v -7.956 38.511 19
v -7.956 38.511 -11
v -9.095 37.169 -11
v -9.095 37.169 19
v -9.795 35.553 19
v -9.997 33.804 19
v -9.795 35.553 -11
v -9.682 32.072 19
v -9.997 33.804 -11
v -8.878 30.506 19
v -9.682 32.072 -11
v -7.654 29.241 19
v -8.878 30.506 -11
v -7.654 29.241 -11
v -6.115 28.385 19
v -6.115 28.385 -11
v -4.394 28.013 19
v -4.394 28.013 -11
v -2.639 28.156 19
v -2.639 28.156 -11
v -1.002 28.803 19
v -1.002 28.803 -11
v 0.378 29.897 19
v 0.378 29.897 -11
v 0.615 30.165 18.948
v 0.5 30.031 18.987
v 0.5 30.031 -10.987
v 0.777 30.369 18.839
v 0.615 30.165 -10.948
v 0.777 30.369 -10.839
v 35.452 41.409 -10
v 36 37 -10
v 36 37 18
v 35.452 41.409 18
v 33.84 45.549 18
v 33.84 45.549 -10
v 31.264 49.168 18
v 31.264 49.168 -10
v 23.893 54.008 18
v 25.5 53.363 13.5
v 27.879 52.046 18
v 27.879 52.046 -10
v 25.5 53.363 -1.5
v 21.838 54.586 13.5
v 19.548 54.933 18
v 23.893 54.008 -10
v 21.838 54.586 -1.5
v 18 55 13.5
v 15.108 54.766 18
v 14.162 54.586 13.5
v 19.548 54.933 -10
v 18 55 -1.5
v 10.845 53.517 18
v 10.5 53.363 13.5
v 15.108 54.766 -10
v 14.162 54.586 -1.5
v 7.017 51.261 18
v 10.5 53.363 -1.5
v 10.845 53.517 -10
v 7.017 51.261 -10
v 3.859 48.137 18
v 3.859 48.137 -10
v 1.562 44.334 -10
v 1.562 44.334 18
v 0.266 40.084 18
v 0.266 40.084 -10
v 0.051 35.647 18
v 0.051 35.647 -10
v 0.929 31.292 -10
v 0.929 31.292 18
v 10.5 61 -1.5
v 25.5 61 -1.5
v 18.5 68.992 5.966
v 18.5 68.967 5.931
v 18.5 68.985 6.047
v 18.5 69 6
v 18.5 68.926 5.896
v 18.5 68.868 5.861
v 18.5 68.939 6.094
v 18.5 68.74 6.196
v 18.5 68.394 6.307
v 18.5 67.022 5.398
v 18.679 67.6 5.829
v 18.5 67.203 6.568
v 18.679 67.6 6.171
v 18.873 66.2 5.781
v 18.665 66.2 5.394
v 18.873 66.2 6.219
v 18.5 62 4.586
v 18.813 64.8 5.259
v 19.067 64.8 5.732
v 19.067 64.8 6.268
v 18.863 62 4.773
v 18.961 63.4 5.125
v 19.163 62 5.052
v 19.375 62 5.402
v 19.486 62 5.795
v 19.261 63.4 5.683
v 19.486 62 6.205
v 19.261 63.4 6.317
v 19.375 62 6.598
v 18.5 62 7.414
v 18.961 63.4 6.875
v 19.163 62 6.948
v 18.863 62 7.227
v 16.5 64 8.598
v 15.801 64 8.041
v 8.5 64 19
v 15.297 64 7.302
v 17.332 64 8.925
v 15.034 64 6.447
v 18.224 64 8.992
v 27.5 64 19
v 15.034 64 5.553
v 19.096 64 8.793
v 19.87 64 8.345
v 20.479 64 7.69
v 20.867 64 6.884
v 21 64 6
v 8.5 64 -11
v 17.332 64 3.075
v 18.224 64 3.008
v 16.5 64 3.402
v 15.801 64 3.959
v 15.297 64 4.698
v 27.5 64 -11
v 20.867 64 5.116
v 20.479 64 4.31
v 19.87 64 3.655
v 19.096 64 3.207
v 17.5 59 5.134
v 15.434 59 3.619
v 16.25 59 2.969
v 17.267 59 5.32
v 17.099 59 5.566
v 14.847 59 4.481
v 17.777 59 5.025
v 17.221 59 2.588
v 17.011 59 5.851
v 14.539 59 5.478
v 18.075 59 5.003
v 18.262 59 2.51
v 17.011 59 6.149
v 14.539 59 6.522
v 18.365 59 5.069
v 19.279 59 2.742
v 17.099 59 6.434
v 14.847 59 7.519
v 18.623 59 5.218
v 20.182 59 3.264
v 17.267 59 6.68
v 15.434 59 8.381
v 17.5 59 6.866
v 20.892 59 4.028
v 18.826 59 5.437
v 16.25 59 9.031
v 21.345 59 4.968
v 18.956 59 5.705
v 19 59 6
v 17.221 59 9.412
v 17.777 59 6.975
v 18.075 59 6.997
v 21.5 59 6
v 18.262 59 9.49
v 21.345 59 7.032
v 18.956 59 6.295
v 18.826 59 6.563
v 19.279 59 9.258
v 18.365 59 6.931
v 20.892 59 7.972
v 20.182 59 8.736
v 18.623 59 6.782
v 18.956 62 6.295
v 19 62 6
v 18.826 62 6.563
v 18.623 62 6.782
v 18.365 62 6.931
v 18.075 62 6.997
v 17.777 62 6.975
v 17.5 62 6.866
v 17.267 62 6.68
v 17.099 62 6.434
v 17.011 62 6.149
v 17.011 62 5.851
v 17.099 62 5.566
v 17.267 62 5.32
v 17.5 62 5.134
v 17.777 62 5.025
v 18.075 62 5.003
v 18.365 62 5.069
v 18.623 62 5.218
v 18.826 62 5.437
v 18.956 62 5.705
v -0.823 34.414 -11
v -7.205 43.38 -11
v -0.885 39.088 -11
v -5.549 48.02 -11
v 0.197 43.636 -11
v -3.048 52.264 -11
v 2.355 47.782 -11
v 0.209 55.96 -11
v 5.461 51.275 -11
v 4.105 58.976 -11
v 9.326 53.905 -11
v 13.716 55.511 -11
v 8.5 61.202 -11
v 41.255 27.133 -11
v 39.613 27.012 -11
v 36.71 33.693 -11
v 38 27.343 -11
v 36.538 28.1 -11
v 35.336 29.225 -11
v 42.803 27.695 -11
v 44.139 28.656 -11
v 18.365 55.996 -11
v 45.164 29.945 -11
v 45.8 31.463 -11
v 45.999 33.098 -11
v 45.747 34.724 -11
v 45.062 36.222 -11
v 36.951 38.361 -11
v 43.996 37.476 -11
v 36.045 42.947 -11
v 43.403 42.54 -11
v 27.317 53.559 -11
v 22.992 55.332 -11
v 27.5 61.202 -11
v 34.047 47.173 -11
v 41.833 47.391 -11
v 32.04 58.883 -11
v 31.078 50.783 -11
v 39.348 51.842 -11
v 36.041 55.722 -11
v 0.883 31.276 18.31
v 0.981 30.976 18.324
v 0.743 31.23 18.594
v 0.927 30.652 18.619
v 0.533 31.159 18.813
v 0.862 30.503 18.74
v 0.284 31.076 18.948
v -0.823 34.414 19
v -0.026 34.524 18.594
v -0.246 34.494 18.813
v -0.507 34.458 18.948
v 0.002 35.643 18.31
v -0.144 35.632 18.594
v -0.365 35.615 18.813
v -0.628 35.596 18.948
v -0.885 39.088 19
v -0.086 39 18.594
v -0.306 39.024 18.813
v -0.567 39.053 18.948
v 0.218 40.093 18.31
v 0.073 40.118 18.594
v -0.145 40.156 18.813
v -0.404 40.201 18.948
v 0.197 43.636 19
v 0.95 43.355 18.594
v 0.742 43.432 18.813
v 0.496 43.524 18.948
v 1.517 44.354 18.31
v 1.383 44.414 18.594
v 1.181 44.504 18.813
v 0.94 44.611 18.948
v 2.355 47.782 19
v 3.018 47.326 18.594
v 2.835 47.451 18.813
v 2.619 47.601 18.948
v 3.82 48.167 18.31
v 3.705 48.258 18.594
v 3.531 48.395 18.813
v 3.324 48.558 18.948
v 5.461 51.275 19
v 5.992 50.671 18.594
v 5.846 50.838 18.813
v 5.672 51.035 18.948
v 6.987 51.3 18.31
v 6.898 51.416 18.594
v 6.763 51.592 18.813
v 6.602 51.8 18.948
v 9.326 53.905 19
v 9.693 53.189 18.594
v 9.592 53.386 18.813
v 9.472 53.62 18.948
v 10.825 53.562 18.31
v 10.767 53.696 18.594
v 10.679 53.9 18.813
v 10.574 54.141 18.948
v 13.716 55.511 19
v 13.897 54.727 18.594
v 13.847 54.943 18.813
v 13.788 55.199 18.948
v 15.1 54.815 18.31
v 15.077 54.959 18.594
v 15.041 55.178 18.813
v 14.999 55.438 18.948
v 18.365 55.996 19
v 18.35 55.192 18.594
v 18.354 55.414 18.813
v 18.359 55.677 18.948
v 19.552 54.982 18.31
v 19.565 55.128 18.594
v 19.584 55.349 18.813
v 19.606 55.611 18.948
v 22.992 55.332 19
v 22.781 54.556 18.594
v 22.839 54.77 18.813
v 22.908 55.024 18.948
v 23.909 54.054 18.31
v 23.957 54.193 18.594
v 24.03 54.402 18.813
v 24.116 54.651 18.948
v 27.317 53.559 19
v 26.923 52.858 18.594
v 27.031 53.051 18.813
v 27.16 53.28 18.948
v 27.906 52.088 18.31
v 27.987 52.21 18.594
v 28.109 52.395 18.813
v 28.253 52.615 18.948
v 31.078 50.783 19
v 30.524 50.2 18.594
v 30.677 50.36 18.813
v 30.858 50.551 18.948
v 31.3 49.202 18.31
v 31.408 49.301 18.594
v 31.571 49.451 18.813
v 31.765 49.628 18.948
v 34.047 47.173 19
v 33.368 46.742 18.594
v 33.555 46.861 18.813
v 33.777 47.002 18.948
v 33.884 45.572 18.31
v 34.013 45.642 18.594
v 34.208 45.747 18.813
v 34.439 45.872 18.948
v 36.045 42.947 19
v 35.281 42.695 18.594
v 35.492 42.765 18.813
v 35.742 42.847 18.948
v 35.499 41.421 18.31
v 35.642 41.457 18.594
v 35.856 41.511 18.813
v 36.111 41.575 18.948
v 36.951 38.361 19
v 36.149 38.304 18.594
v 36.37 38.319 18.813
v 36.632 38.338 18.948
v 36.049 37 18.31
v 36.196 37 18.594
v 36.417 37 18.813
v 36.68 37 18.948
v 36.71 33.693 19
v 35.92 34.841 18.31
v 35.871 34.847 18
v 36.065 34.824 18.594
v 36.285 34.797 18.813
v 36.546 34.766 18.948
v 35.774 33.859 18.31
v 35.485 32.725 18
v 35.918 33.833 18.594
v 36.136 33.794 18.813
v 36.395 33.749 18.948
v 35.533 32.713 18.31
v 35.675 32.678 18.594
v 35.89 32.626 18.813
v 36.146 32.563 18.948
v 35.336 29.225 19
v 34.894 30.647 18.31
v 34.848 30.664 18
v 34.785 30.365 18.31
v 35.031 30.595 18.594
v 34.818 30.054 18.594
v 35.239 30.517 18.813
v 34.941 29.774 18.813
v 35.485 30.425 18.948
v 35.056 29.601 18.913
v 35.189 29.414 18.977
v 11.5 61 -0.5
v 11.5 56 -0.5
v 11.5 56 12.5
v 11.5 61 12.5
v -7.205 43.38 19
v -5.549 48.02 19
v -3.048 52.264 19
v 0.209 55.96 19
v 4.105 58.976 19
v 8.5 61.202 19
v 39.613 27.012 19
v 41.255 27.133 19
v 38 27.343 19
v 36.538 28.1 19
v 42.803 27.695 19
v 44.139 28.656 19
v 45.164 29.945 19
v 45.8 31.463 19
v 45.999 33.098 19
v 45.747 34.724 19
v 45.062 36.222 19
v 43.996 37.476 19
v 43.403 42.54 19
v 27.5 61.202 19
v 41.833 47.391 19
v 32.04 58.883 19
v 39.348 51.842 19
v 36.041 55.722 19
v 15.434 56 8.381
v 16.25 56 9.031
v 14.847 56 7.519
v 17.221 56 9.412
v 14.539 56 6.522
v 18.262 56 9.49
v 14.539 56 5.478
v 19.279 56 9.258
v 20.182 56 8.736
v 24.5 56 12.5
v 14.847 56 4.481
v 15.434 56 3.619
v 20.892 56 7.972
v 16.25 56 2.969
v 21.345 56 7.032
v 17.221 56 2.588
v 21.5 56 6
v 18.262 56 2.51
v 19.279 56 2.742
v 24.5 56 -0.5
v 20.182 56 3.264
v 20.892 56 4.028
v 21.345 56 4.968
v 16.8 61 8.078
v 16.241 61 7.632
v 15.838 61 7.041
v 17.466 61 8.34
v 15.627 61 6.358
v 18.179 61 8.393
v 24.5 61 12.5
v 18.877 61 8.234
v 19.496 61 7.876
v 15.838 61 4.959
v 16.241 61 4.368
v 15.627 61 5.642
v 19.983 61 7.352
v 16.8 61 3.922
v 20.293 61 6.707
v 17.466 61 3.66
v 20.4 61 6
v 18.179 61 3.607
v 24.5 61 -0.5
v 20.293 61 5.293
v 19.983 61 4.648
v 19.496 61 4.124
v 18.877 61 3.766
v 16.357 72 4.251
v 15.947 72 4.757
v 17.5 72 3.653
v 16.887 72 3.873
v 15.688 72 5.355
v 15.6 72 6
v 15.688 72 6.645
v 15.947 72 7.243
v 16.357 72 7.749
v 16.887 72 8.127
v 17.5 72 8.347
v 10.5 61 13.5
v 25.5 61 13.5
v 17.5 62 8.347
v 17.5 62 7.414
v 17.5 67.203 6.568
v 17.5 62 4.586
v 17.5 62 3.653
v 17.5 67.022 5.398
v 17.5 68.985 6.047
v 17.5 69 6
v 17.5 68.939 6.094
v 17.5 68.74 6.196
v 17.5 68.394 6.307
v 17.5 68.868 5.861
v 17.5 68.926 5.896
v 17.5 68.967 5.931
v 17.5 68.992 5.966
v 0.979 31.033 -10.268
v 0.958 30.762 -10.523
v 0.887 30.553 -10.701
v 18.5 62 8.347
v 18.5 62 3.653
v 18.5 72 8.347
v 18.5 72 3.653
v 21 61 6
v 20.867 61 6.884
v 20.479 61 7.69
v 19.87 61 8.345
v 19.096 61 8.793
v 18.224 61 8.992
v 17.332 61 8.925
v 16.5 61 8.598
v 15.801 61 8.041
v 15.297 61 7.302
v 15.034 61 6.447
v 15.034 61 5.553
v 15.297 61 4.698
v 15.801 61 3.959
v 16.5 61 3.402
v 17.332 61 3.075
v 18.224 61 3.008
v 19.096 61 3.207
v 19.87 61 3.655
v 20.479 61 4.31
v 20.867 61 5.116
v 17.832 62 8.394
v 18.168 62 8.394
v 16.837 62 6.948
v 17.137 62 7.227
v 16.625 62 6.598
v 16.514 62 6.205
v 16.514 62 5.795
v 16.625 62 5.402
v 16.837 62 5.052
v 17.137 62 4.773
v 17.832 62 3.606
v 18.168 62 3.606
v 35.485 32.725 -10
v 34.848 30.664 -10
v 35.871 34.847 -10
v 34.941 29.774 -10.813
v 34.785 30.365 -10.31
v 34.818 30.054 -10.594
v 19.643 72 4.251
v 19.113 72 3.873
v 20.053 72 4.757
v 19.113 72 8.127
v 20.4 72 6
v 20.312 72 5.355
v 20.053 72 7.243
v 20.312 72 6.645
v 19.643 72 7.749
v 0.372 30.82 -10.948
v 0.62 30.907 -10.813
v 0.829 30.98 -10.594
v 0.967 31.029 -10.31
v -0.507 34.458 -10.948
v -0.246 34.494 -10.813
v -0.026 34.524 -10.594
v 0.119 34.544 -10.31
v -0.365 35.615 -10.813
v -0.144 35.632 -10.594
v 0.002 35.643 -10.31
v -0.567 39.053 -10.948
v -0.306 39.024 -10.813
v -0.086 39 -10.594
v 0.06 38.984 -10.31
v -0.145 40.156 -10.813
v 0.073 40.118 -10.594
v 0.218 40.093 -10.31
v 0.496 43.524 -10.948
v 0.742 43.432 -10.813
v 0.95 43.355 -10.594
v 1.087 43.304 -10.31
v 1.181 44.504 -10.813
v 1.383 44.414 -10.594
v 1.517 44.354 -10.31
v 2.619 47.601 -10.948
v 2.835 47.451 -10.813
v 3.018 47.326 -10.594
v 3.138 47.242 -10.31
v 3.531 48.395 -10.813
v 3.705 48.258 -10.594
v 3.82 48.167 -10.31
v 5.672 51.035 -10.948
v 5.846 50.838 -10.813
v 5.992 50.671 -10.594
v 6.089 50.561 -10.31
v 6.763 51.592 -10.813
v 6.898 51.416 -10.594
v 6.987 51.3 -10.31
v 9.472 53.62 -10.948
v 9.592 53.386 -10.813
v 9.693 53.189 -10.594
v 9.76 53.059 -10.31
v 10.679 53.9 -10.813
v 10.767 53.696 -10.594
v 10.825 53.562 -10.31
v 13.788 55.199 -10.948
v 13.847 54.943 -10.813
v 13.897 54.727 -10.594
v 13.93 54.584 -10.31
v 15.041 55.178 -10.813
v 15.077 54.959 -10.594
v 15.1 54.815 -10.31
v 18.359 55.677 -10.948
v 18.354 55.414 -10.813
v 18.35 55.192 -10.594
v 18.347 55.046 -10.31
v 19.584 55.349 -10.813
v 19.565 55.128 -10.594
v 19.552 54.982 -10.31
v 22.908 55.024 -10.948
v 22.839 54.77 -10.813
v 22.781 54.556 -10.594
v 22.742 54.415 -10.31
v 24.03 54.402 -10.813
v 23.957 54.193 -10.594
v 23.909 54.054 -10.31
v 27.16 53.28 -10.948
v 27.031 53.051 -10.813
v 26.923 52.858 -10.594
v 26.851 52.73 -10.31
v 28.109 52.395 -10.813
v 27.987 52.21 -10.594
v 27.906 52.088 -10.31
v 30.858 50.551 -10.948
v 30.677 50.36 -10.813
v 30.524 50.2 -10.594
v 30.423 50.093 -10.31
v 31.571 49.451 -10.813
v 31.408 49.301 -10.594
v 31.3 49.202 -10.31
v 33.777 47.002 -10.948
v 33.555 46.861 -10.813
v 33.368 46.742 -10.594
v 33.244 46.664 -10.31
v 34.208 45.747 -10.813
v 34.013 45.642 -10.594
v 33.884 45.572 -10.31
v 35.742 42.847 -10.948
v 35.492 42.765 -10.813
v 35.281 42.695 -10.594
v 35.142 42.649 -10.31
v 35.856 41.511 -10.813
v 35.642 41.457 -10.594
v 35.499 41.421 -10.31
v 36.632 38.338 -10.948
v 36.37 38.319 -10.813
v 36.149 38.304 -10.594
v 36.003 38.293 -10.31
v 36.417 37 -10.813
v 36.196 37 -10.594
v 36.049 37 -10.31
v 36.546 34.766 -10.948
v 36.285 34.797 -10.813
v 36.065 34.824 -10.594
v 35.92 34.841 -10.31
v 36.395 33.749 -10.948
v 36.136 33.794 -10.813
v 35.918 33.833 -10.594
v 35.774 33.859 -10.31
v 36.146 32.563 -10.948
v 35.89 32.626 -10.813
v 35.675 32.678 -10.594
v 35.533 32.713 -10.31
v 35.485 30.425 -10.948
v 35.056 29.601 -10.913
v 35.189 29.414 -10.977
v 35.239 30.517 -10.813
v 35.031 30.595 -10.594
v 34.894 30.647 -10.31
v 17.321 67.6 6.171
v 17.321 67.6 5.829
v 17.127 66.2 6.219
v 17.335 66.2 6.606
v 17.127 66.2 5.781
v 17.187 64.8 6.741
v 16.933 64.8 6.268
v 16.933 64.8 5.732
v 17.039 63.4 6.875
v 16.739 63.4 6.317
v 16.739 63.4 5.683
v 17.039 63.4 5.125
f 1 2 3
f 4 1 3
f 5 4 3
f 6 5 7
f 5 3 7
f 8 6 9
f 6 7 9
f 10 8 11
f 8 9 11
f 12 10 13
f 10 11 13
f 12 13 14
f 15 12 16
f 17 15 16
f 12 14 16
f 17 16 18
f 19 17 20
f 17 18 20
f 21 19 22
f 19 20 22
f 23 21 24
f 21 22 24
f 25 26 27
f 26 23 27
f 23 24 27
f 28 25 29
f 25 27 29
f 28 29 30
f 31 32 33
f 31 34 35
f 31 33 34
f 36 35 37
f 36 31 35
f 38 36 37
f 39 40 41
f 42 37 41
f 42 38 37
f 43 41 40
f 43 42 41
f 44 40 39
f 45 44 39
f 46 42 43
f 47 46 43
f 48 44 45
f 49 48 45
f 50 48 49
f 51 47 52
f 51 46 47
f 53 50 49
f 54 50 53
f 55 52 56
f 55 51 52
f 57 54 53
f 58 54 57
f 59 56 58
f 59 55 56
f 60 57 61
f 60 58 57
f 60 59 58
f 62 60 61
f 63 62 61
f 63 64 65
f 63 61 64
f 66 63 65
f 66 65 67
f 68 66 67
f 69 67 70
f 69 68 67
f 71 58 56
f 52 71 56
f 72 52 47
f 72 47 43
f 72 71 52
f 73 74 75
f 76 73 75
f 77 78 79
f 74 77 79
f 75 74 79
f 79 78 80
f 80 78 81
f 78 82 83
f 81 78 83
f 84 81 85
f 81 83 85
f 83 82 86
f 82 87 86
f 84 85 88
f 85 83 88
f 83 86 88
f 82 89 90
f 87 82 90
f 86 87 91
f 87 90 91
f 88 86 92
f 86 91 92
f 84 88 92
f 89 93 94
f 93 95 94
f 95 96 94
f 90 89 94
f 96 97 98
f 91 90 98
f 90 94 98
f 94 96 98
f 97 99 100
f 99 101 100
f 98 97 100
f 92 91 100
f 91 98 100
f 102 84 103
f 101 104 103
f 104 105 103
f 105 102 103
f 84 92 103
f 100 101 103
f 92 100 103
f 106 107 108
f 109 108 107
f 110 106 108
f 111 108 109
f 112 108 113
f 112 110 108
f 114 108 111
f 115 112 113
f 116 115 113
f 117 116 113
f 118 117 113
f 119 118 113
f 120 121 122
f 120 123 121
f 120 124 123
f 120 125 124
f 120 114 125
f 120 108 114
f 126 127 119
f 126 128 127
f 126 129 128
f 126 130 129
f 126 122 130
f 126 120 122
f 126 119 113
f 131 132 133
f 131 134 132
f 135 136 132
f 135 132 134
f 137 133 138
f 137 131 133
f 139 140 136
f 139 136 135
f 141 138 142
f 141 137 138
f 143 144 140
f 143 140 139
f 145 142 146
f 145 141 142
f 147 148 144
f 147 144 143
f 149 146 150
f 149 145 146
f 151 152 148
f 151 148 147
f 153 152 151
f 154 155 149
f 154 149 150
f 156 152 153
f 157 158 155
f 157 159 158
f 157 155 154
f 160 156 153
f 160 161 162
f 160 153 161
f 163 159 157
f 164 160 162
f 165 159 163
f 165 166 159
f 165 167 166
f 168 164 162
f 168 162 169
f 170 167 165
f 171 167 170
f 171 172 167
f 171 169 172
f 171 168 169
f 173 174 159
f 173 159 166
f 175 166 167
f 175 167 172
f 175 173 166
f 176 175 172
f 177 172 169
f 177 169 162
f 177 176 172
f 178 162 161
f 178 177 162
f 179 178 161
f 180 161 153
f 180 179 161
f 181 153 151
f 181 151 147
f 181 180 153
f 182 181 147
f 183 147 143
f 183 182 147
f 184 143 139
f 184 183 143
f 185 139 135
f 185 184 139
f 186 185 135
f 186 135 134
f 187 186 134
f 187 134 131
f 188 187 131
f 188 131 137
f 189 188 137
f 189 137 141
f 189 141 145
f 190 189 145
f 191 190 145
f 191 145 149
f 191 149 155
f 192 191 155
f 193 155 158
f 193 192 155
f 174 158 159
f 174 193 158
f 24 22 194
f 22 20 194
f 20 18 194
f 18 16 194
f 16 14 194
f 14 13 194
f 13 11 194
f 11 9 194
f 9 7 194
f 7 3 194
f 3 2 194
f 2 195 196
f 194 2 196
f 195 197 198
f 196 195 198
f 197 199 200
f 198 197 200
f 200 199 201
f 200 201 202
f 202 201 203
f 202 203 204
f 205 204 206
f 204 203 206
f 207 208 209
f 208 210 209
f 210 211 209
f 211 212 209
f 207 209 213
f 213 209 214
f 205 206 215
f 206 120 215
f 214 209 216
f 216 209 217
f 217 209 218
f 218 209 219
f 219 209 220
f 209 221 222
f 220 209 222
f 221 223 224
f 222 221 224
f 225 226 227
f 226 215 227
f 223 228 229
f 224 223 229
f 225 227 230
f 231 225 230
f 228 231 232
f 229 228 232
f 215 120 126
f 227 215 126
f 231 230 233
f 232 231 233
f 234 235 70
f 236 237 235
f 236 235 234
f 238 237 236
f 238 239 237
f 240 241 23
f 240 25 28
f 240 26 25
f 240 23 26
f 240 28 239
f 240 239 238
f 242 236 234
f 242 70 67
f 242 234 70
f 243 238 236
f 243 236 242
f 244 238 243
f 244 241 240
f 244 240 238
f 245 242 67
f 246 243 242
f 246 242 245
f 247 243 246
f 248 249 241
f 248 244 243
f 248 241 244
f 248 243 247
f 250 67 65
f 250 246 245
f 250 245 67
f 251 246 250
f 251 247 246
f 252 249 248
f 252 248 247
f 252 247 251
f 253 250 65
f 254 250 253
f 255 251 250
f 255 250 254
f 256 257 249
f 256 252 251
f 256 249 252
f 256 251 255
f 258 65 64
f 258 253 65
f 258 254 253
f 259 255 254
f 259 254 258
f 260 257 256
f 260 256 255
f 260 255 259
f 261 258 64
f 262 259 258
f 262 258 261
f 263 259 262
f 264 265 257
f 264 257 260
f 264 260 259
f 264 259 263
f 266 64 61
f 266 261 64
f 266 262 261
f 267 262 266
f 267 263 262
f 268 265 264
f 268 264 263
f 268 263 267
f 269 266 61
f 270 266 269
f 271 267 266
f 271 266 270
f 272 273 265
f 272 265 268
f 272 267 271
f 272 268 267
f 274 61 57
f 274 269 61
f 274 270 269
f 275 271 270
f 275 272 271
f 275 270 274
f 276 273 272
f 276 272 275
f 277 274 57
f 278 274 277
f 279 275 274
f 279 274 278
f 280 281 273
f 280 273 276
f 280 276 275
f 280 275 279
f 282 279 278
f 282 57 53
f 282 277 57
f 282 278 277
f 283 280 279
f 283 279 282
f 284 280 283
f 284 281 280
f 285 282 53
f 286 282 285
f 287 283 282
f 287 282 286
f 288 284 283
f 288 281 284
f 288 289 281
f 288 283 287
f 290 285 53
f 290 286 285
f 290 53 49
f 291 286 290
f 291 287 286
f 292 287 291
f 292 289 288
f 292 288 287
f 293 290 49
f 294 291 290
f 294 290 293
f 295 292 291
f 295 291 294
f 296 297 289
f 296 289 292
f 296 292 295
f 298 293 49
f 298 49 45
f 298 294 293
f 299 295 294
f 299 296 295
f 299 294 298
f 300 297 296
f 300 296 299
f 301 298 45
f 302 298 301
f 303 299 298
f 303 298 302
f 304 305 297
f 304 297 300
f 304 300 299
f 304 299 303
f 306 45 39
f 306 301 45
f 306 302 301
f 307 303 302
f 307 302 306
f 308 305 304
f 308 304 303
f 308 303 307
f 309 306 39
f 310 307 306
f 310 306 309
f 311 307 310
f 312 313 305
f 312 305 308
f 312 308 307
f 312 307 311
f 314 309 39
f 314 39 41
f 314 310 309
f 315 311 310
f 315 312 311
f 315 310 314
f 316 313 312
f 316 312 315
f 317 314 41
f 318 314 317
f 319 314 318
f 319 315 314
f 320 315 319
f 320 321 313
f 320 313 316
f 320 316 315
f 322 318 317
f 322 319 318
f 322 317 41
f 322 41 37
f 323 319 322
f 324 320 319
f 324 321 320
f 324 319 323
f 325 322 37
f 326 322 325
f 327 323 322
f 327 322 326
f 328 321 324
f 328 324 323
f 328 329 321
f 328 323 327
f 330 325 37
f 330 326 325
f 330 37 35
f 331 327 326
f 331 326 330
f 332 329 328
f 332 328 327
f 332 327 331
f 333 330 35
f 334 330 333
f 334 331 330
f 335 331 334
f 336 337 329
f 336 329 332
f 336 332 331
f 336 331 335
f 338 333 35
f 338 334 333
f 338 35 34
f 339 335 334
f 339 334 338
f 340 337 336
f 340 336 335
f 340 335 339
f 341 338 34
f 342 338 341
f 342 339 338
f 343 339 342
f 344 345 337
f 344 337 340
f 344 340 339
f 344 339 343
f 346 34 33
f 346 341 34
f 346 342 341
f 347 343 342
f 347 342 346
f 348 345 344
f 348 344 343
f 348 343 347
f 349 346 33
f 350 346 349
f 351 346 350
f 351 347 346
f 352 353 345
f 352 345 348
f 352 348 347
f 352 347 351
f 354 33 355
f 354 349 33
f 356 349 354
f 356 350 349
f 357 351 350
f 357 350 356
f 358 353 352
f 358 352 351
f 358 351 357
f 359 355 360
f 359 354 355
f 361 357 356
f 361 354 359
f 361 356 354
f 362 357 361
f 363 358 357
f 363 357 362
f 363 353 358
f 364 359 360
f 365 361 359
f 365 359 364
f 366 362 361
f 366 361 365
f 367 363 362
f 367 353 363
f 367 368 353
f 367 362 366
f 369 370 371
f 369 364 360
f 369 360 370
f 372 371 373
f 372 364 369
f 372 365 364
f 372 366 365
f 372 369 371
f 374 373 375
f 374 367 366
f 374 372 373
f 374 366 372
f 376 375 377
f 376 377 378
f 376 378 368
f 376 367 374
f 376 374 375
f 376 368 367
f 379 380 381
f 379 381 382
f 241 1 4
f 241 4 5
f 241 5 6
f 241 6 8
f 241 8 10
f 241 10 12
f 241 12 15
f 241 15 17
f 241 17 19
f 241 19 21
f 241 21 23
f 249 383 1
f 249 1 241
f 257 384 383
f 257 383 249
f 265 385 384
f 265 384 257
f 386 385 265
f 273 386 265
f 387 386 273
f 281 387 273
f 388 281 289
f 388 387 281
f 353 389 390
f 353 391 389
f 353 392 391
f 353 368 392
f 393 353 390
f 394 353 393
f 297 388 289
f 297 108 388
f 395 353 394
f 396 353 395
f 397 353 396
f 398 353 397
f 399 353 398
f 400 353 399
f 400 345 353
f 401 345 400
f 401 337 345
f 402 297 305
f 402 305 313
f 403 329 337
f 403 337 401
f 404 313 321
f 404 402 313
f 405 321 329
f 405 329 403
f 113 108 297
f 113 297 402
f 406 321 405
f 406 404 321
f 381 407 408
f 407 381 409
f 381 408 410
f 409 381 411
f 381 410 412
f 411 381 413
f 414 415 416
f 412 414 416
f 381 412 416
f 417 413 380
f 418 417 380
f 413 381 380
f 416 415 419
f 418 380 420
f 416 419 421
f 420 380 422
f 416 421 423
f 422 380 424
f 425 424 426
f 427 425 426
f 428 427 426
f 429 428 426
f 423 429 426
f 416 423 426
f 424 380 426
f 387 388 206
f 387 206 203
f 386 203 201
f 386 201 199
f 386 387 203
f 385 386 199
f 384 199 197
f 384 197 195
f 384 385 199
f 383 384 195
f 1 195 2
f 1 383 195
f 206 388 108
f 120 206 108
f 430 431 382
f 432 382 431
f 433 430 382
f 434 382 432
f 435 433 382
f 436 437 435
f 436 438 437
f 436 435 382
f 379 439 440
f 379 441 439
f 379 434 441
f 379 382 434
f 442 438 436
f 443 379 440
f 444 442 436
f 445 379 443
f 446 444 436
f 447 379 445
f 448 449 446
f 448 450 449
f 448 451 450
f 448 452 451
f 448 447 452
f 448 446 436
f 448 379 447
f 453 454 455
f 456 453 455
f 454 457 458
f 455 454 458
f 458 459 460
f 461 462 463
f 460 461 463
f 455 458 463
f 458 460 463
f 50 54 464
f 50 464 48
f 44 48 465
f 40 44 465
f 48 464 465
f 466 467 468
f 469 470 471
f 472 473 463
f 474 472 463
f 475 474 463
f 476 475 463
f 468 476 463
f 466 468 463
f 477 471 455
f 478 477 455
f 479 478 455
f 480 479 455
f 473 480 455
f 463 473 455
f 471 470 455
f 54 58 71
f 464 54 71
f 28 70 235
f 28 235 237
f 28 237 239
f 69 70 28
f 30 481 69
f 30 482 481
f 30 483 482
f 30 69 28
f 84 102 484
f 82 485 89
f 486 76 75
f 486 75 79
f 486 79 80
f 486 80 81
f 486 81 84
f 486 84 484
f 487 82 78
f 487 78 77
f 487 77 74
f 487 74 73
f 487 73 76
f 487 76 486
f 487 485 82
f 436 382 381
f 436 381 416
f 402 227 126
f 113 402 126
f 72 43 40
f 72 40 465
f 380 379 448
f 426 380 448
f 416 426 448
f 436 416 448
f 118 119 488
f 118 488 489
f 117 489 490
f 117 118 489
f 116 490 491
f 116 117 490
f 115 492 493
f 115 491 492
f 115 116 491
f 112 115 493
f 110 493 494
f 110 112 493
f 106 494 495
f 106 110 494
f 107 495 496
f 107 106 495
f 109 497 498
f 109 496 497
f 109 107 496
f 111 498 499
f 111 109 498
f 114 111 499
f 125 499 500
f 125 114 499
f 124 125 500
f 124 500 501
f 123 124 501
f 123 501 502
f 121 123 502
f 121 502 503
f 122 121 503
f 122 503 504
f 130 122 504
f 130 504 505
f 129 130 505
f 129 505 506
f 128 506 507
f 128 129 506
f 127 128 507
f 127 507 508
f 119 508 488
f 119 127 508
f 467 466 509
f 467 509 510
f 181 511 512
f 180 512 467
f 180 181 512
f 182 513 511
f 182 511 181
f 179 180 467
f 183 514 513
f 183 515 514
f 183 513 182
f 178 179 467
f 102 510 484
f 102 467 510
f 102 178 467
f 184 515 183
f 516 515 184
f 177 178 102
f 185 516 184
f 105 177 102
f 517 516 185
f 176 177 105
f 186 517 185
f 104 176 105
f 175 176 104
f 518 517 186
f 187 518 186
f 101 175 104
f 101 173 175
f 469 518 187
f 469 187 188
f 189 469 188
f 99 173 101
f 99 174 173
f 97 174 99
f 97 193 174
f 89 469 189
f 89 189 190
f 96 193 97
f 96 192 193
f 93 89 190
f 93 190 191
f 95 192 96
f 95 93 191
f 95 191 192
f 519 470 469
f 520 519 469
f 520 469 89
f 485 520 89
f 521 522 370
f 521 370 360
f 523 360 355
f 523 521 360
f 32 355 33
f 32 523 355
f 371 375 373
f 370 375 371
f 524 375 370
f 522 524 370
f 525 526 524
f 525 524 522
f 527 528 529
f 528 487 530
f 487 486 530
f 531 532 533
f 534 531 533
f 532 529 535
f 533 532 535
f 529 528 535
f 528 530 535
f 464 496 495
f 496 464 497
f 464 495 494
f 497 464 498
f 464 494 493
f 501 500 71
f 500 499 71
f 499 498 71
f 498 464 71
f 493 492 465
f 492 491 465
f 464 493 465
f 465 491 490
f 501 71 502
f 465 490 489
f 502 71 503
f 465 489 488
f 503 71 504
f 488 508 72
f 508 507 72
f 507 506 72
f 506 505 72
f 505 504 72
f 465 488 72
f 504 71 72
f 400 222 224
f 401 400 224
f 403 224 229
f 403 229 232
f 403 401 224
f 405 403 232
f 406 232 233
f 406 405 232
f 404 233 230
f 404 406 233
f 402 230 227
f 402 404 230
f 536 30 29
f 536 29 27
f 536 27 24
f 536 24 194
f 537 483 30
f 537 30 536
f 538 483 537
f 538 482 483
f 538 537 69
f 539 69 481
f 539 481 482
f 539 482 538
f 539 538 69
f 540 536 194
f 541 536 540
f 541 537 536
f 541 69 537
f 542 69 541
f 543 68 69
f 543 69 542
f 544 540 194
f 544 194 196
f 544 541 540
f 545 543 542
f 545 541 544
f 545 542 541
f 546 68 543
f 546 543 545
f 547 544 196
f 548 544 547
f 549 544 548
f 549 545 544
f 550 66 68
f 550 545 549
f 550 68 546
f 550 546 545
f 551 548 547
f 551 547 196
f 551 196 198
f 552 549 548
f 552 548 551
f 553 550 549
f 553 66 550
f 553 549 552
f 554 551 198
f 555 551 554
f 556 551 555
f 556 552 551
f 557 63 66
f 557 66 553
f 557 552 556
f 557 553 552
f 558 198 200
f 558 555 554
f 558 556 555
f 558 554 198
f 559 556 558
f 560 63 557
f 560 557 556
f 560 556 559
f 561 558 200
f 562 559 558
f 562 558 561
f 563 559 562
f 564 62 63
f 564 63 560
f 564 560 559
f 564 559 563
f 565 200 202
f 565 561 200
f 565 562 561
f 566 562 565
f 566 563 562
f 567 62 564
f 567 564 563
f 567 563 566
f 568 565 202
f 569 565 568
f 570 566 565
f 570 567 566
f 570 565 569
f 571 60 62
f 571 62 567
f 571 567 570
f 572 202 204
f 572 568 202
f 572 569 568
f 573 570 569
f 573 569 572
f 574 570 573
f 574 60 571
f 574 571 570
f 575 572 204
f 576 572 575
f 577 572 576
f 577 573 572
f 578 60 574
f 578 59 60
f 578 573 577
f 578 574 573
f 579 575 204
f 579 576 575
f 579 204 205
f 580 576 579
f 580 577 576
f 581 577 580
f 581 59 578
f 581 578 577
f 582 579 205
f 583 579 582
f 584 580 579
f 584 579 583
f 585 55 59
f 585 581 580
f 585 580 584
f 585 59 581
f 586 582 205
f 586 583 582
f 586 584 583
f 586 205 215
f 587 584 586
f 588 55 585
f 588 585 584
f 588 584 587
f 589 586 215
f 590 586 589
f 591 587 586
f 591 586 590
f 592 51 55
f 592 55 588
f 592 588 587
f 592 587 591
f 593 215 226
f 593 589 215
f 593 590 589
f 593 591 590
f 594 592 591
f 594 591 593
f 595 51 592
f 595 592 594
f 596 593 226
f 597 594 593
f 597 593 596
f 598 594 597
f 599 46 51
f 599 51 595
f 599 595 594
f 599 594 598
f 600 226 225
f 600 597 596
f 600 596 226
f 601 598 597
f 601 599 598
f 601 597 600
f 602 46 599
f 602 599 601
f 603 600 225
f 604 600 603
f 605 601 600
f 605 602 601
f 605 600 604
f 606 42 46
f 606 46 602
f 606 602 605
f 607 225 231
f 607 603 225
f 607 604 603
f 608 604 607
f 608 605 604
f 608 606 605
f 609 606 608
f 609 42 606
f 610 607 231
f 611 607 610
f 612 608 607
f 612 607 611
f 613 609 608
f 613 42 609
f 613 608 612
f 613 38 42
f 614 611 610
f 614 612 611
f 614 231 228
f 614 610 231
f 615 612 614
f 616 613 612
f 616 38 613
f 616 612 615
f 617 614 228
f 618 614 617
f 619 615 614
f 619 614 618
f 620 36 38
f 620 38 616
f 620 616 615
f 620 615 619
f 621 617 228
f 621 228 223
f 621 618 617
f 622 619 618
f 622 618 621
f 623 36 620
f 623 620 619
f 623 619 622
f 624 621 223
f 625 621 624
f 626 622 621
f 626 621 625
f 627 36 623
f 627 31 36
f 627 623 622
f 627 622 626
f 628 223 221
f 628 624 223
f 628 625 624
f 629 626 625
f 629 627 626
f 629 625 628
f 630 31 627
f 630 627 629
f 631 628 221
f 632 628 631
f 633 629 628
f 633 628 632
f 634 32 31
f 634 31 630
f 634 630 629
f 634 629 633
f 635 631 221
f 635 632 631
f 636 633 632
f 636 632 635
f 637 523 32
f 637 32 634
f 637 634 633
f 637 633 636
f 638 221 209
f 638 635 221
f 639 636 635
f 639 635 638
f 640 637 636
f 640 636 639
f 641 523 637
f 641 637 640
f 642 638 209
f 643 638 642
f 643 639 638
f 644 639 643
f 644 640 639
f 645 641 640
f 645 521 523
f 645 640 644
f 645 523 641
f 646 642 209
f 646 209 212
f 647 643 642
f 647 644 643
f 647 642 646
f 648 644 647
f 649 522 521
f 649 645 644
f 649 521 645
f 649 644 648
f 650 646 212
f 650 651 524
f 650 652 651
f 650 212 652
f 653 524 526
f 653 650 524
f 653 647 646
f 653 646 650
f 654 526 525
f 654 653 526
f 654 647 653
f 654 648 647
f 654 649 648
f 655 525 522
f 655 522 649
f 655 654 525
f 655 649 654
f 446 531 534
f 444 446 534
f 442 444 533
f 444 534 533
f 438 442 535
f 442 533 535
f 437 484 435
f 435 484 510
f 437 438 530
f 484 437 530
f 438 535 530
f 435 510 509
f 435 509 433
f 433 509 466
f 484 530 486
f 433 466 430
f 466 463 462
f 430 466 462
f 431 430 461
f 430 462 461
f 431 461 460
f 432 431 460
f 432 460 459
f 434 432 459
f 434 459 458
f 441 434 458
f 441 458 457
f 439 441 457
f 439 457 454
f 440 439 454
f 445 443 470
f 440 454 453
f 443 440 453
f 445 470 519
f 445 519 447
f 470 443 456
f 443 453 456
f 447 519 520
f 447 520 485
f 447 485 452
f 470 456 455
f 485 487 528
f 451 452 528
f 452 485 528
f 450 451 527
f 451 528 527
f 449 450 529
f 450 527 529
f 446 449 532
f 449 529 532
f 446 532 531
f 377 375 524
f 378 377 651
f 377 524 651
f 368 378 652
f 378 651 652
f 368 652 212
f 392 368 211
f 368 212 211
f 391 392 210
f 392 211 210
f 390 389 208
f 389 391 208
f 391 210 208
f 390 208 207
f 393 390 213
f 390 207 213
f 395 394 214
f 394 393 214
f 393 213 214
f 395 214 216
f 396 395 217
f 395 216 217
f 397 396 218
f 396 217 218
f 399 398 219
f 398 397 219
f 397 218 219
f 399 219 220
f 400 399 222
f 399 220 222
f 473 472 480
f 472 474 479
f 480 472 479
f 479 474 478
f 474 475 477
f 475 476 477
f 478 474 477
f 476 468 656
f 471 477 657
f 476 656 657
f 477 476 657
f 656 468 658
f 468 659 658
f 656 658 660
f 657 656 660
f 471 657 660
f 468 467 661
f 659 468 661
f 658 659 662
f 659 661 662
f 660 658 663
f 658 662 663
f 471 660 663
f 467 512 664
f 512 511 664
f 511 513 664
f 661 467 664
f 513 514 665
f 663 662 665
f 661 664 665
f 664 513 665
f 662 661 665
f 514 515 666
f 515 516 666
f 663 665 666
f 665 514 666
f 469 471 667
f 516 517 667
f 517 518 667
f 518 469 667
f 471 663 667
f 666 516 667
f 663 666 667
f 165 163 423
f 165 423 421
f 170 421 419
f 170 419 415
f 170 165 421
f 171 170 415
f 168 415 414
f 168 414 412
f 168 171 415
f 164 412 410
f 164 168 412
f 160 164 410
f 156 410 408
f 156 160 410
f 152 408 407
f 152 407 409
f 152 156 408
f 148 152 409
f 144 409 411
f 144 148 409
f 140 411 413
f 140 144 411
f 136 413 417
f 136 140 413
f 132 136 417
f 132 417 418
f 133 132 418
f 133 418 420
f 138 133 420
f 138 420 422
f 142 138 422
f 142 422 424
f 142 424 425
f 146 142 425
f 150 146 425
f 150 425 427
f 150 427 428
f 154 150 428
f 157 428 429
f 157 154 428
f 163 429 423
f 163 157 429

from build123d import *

# Parameters (mm, degrees)
CONE_ROLL_ANGLE             = 90
CYLINDER_R                  = 1
CYLINDER_DEPTH              = 3
CYLINDER_ROLL_ANGLE         = 90
CYLINDER005_R               = 3.5
CYLINDER005_DEPTH           = 3
CYLINDER005_ROLL_ANGLE      = 90
BOX_W                       = 1
BOX_H                       = 10
BOX_DEPTH                   = 10
BOX002_W                    = 13
BOX002_H                    = 5
BOX002_DEPTH                = 13
CYLINDER002_R               = 2.4
CYLINDER002_DEPTH           = 13
CYLINDER002_ROLL_ANGLE      = 90
CYLINDER006_R               = 18
CYLINDER006_DEPTH           = 32
CYLINDER010_R               = 3
CYLINDER010_DEPTH           = 13
CYLINDER010_ROLL_ANGLE      = 90
BOX003_W                    = 15
BOX003_H                    = 8
BOX003_DEPTH                = 15
CYLINDER009_R               = 6
CYLINDER009_DEPTH           = 30
CYLINDER007_W               = 26
CYLINDER007_H               = 30
CYLINDER007_ANGLE           = 201
CYLINDER007_PLACEMENT_ANGLE = -11
BOX004_W                    = 19
BOX004_H                    = 3
BOX004_DEPTH                = 30
CYLINDER008_R               = 6
CYLINDER008_DEPTH           = 30
FILLET_R                    = 1


with BuildPart() as screw_guide:
    # Cone → Cone (revolve)
    with BuildSketch(Plane.XZ):
        Polygon((0, 0), (0.5, 0), (1.5, 7), (0, 7), align=None)
    revolve(axis=Axis((0, 0, 0), (0, 0, 1)))


with BuildPart() as screw_guide_1:
    # Cone roll: moved
    add(screw_guide.part.rotate(Axis((0, 0, 0), (1, 0, 0)), CONE_ROLL_ANGLE))


with BuildPart() as screw_guide_2:
    # Cone placement: moved
    add(screw_guide_1.part.moved(Location((18, 69, 6))))


with BuildPart() as hole:
    # Cylinder → Cylinder (new body)
    with BuildSketch(Plane.XY):
        Circle(CYLINDER_R)
    extrude(amount=CYLINDER_DEPTH)


with BuildPart() as hole_1:
    # Cylinder roll: moved
    add(hole.part.rotate(Axis((0, 0, 0), (1, 0, 0)), CYLINDER_ROLL_ANGLE))


with BuildPart() as hole_2:
    # Cylinder placement: moved
    add(hole_1.part.moved(Location((18, 62, 6))))


with BuildPart() as screw_head_seat:
    # Cylinder005 → Cylinder005 (new body)
    with BuildSketch(Plane.XY):
        Circle(CYLINDER005_R)
    extrude(amount=CYLINDER005_DEPTH)


with BuildPart() as screw_head_seat_1:
    # Cylinder005 roll: moved
    add(screw_head_seat.part.rotate(Axis((0, 0, 0), (1, 0, 0)), CYLINDER005_ROLL_ANGLE))


with BuildPart() as screw_head_seat_2:
    # Cylinder005 placement: moved
    add(screw_head_seat_1.part.moved(Location((18, 59, 6))))


with BuildPart() as hole_and_cut:
    # Box → Box (new body)
    with BuildSketch(Plane(origin=(17.5, 62, 1), x_dir=(1, 0, 0), z_dir=(0, 0, 1))):
        with Locations((0.5, 5)):
            Rectangle(BOX_W, BOX_H)
    extrude(amount=BOX_DEPTH)

    # Fusion: union screw guide, hole, screw head seat
    add(screw_guide_2.part)
    add(hole_2.part)
    add(screw_head_seat_2.part)


with BuildPart() as squared_washer:
    # Box002 → Box002 (new body)
    with BuildSketch(Plane(origin=(11.5, 56, -0.5), x_dir=(1, 0, 0), z_dir=(0, 0, 1))):
        with Locations((6.5, 2.5)):
            Rectangle(BOX002_W, BOX002_H)
    extrude(amount=BOX002_DEPTH)


with BuildPart() as anchor_with_hole_and_cut:
    # Cylinder002 → Cylinder002 (new body)
    with BuildSketch(Plane.XY):
        Circle(CYLINDER002_R)
    extrude(amount=CYLINDER002_DEPTH)


with BuildPart() as anchor_with_hole_and_cut_1:
    # Cylinder002 roll: moved
    add(anchor_with_hole_and_cut.part.rotate(Axis((0, 0, 0), (1, 0, 0)), CYLINDER002_ROLL_ANGLE))


with BuildPart() as anchor_with_hole_and_cut_2:
    # Cylinder002 placement: moved
    add(anchor_with_hole_and_cut_1.part.moved(Location((18, 72, 6))))

    # Fusion001: union squared washer
    add(squared_washer.part)

    # Cut: cut hole and cut
    add(hole_and_cut.part, mode=Mode.SUBTRACT)


with BuildPart() as vacuum_cleaner_tube_template:
    # Cylinder006 → Cylinder006 (new body)
    with BuildSketch(Plane(origin=(18, 37, -12), x_dir=(1, 0, 0), z_dir=(0, 0, 1))):
        Circle(CYLINDER006_R)
    extrude(amount=CYLINDER006_DEPTH)


with BuildPart() as anchor_pin_seat:
    # Cylinder010 → Cylinder010 (new body)
    with BuildSketch(Plane.XY):
        Circle(CYLINDER010_R)
    extrude(amount=CYLINDER010_DEPTH)


with BuildPart() as anchor_pin_seat_1:
    # Cylinder010 roll: moved
    add(anchor_pin_seat.part.rotate(Axis((0, 0, 0), (1, 0, 0)), CYLINDER010_ROLL_ANGLE))


with BuildPart() as anchor_pin_seat_2:
    # Cylinder010 placement: moved
    add(anchor_pin_seat_1.part.moved(Location((18, 72, 6))))


with BuildPart() as holes:
    # Box003 → Box003 (new body)
    with BuildSketch(Plane(origin=(10.5, 53, -1.5), x_dir=(1, 0, 0), z_dir=(0, 0, 1))):
        with Locations((7.5, 4)):
            Rectangle(BOX003_W, BOX003_H)
    extrude(amount=BOX003_DEPTH)

    # Fusion003: union vacuum cleaner tube template, anchor pin seat
    add(vacuum_cleaner_tube_template.part)
    add(anchor_pin_seat_2.part)


with BuildPart() as cylinder009:
    # Cylinder009 → Cylinder009 (new body)
    with BuildSketch(Plane(origin=(40, 33, -11), x_dir=(1, 0, 0), z_dir=(0, 0, 1))):
        Circle(CYLINDER009_R)
    extrude(amount=CYLINDER009_DEPTH)


with BuildPart() as arms:
    # Cylinder007 → Cylinder007 (revolve)
    with BuildSketch(Plane.XZ):
        with Locations((13, 15)):
            Rectangle(CYLINDER007_W, CYLINDER007_H)
    revolve(axis=Axis((0, 0, 0), (0, 0, 1)), revolution_arc=CYLINDER007_ANGLE)


with BuildPart() as arms_1:
    # Cylinder007 placement: moved
    add(arms.part.moved(Location((18, 37, -11))).rotate(Axis((18, 37, -11), (0, 0, 1)), CYLINDER007_PLACEMENT_ANGLE))


with BuildPart() as stabilizer_shim:
    # Box004 → Box004 (new body)
    with BuildSketch(Plane(origin=(8.5, 61, -11), x_dir=(1, 0, 0), z_dir=(0, 0, 1))):
        with Locations((9.5, 1.5)):
            Rectangle(BOX004_W, BOX004_H)
    extrude(amount=BOX004_DEPTH)


with BuildPart() as holder_with_holes_and_fillets:
    # Cylinder008 → Cylinder008 (new body)
    with BuildSketch(Plane(origin=(-4, 34, -11), x_dir=(1, 0, 0), z_dir=(0, 0, 1))):
        Circle(CYLINDER008_R)
    extrude(amount=CYLINDER008_DEPTH)

    # Fusion002: union Cylinder009, arms, stabilizer shim
    add(cylinder009.part)
    add(arms_1.part)
    add(stabilizer_shim.part)

    # Cut001: cut holes
    add(holes.part, mode=Mode.SUBTRACT)

    # Fillet
    fillet_edges = [holder_with_holes_and_fillets.edges().sort_by_distance(p)[0] for p in [
        (1.091877, 30.826234, 4),
        (0.615735, 32.332312, 19),
        (0.615735, 32.332312, -11),
        (35.25449, 31.873348, 19),
        (35.25449, 31.873348, -11),
        (34.678052, 30.229284, 4),
    ]]
    fillet(fillet_edges, radius=FILLET_R)


solid = Compound([anchor_with_hole_and_cut_2.part, holder_with_holes_and_fillets.part])
